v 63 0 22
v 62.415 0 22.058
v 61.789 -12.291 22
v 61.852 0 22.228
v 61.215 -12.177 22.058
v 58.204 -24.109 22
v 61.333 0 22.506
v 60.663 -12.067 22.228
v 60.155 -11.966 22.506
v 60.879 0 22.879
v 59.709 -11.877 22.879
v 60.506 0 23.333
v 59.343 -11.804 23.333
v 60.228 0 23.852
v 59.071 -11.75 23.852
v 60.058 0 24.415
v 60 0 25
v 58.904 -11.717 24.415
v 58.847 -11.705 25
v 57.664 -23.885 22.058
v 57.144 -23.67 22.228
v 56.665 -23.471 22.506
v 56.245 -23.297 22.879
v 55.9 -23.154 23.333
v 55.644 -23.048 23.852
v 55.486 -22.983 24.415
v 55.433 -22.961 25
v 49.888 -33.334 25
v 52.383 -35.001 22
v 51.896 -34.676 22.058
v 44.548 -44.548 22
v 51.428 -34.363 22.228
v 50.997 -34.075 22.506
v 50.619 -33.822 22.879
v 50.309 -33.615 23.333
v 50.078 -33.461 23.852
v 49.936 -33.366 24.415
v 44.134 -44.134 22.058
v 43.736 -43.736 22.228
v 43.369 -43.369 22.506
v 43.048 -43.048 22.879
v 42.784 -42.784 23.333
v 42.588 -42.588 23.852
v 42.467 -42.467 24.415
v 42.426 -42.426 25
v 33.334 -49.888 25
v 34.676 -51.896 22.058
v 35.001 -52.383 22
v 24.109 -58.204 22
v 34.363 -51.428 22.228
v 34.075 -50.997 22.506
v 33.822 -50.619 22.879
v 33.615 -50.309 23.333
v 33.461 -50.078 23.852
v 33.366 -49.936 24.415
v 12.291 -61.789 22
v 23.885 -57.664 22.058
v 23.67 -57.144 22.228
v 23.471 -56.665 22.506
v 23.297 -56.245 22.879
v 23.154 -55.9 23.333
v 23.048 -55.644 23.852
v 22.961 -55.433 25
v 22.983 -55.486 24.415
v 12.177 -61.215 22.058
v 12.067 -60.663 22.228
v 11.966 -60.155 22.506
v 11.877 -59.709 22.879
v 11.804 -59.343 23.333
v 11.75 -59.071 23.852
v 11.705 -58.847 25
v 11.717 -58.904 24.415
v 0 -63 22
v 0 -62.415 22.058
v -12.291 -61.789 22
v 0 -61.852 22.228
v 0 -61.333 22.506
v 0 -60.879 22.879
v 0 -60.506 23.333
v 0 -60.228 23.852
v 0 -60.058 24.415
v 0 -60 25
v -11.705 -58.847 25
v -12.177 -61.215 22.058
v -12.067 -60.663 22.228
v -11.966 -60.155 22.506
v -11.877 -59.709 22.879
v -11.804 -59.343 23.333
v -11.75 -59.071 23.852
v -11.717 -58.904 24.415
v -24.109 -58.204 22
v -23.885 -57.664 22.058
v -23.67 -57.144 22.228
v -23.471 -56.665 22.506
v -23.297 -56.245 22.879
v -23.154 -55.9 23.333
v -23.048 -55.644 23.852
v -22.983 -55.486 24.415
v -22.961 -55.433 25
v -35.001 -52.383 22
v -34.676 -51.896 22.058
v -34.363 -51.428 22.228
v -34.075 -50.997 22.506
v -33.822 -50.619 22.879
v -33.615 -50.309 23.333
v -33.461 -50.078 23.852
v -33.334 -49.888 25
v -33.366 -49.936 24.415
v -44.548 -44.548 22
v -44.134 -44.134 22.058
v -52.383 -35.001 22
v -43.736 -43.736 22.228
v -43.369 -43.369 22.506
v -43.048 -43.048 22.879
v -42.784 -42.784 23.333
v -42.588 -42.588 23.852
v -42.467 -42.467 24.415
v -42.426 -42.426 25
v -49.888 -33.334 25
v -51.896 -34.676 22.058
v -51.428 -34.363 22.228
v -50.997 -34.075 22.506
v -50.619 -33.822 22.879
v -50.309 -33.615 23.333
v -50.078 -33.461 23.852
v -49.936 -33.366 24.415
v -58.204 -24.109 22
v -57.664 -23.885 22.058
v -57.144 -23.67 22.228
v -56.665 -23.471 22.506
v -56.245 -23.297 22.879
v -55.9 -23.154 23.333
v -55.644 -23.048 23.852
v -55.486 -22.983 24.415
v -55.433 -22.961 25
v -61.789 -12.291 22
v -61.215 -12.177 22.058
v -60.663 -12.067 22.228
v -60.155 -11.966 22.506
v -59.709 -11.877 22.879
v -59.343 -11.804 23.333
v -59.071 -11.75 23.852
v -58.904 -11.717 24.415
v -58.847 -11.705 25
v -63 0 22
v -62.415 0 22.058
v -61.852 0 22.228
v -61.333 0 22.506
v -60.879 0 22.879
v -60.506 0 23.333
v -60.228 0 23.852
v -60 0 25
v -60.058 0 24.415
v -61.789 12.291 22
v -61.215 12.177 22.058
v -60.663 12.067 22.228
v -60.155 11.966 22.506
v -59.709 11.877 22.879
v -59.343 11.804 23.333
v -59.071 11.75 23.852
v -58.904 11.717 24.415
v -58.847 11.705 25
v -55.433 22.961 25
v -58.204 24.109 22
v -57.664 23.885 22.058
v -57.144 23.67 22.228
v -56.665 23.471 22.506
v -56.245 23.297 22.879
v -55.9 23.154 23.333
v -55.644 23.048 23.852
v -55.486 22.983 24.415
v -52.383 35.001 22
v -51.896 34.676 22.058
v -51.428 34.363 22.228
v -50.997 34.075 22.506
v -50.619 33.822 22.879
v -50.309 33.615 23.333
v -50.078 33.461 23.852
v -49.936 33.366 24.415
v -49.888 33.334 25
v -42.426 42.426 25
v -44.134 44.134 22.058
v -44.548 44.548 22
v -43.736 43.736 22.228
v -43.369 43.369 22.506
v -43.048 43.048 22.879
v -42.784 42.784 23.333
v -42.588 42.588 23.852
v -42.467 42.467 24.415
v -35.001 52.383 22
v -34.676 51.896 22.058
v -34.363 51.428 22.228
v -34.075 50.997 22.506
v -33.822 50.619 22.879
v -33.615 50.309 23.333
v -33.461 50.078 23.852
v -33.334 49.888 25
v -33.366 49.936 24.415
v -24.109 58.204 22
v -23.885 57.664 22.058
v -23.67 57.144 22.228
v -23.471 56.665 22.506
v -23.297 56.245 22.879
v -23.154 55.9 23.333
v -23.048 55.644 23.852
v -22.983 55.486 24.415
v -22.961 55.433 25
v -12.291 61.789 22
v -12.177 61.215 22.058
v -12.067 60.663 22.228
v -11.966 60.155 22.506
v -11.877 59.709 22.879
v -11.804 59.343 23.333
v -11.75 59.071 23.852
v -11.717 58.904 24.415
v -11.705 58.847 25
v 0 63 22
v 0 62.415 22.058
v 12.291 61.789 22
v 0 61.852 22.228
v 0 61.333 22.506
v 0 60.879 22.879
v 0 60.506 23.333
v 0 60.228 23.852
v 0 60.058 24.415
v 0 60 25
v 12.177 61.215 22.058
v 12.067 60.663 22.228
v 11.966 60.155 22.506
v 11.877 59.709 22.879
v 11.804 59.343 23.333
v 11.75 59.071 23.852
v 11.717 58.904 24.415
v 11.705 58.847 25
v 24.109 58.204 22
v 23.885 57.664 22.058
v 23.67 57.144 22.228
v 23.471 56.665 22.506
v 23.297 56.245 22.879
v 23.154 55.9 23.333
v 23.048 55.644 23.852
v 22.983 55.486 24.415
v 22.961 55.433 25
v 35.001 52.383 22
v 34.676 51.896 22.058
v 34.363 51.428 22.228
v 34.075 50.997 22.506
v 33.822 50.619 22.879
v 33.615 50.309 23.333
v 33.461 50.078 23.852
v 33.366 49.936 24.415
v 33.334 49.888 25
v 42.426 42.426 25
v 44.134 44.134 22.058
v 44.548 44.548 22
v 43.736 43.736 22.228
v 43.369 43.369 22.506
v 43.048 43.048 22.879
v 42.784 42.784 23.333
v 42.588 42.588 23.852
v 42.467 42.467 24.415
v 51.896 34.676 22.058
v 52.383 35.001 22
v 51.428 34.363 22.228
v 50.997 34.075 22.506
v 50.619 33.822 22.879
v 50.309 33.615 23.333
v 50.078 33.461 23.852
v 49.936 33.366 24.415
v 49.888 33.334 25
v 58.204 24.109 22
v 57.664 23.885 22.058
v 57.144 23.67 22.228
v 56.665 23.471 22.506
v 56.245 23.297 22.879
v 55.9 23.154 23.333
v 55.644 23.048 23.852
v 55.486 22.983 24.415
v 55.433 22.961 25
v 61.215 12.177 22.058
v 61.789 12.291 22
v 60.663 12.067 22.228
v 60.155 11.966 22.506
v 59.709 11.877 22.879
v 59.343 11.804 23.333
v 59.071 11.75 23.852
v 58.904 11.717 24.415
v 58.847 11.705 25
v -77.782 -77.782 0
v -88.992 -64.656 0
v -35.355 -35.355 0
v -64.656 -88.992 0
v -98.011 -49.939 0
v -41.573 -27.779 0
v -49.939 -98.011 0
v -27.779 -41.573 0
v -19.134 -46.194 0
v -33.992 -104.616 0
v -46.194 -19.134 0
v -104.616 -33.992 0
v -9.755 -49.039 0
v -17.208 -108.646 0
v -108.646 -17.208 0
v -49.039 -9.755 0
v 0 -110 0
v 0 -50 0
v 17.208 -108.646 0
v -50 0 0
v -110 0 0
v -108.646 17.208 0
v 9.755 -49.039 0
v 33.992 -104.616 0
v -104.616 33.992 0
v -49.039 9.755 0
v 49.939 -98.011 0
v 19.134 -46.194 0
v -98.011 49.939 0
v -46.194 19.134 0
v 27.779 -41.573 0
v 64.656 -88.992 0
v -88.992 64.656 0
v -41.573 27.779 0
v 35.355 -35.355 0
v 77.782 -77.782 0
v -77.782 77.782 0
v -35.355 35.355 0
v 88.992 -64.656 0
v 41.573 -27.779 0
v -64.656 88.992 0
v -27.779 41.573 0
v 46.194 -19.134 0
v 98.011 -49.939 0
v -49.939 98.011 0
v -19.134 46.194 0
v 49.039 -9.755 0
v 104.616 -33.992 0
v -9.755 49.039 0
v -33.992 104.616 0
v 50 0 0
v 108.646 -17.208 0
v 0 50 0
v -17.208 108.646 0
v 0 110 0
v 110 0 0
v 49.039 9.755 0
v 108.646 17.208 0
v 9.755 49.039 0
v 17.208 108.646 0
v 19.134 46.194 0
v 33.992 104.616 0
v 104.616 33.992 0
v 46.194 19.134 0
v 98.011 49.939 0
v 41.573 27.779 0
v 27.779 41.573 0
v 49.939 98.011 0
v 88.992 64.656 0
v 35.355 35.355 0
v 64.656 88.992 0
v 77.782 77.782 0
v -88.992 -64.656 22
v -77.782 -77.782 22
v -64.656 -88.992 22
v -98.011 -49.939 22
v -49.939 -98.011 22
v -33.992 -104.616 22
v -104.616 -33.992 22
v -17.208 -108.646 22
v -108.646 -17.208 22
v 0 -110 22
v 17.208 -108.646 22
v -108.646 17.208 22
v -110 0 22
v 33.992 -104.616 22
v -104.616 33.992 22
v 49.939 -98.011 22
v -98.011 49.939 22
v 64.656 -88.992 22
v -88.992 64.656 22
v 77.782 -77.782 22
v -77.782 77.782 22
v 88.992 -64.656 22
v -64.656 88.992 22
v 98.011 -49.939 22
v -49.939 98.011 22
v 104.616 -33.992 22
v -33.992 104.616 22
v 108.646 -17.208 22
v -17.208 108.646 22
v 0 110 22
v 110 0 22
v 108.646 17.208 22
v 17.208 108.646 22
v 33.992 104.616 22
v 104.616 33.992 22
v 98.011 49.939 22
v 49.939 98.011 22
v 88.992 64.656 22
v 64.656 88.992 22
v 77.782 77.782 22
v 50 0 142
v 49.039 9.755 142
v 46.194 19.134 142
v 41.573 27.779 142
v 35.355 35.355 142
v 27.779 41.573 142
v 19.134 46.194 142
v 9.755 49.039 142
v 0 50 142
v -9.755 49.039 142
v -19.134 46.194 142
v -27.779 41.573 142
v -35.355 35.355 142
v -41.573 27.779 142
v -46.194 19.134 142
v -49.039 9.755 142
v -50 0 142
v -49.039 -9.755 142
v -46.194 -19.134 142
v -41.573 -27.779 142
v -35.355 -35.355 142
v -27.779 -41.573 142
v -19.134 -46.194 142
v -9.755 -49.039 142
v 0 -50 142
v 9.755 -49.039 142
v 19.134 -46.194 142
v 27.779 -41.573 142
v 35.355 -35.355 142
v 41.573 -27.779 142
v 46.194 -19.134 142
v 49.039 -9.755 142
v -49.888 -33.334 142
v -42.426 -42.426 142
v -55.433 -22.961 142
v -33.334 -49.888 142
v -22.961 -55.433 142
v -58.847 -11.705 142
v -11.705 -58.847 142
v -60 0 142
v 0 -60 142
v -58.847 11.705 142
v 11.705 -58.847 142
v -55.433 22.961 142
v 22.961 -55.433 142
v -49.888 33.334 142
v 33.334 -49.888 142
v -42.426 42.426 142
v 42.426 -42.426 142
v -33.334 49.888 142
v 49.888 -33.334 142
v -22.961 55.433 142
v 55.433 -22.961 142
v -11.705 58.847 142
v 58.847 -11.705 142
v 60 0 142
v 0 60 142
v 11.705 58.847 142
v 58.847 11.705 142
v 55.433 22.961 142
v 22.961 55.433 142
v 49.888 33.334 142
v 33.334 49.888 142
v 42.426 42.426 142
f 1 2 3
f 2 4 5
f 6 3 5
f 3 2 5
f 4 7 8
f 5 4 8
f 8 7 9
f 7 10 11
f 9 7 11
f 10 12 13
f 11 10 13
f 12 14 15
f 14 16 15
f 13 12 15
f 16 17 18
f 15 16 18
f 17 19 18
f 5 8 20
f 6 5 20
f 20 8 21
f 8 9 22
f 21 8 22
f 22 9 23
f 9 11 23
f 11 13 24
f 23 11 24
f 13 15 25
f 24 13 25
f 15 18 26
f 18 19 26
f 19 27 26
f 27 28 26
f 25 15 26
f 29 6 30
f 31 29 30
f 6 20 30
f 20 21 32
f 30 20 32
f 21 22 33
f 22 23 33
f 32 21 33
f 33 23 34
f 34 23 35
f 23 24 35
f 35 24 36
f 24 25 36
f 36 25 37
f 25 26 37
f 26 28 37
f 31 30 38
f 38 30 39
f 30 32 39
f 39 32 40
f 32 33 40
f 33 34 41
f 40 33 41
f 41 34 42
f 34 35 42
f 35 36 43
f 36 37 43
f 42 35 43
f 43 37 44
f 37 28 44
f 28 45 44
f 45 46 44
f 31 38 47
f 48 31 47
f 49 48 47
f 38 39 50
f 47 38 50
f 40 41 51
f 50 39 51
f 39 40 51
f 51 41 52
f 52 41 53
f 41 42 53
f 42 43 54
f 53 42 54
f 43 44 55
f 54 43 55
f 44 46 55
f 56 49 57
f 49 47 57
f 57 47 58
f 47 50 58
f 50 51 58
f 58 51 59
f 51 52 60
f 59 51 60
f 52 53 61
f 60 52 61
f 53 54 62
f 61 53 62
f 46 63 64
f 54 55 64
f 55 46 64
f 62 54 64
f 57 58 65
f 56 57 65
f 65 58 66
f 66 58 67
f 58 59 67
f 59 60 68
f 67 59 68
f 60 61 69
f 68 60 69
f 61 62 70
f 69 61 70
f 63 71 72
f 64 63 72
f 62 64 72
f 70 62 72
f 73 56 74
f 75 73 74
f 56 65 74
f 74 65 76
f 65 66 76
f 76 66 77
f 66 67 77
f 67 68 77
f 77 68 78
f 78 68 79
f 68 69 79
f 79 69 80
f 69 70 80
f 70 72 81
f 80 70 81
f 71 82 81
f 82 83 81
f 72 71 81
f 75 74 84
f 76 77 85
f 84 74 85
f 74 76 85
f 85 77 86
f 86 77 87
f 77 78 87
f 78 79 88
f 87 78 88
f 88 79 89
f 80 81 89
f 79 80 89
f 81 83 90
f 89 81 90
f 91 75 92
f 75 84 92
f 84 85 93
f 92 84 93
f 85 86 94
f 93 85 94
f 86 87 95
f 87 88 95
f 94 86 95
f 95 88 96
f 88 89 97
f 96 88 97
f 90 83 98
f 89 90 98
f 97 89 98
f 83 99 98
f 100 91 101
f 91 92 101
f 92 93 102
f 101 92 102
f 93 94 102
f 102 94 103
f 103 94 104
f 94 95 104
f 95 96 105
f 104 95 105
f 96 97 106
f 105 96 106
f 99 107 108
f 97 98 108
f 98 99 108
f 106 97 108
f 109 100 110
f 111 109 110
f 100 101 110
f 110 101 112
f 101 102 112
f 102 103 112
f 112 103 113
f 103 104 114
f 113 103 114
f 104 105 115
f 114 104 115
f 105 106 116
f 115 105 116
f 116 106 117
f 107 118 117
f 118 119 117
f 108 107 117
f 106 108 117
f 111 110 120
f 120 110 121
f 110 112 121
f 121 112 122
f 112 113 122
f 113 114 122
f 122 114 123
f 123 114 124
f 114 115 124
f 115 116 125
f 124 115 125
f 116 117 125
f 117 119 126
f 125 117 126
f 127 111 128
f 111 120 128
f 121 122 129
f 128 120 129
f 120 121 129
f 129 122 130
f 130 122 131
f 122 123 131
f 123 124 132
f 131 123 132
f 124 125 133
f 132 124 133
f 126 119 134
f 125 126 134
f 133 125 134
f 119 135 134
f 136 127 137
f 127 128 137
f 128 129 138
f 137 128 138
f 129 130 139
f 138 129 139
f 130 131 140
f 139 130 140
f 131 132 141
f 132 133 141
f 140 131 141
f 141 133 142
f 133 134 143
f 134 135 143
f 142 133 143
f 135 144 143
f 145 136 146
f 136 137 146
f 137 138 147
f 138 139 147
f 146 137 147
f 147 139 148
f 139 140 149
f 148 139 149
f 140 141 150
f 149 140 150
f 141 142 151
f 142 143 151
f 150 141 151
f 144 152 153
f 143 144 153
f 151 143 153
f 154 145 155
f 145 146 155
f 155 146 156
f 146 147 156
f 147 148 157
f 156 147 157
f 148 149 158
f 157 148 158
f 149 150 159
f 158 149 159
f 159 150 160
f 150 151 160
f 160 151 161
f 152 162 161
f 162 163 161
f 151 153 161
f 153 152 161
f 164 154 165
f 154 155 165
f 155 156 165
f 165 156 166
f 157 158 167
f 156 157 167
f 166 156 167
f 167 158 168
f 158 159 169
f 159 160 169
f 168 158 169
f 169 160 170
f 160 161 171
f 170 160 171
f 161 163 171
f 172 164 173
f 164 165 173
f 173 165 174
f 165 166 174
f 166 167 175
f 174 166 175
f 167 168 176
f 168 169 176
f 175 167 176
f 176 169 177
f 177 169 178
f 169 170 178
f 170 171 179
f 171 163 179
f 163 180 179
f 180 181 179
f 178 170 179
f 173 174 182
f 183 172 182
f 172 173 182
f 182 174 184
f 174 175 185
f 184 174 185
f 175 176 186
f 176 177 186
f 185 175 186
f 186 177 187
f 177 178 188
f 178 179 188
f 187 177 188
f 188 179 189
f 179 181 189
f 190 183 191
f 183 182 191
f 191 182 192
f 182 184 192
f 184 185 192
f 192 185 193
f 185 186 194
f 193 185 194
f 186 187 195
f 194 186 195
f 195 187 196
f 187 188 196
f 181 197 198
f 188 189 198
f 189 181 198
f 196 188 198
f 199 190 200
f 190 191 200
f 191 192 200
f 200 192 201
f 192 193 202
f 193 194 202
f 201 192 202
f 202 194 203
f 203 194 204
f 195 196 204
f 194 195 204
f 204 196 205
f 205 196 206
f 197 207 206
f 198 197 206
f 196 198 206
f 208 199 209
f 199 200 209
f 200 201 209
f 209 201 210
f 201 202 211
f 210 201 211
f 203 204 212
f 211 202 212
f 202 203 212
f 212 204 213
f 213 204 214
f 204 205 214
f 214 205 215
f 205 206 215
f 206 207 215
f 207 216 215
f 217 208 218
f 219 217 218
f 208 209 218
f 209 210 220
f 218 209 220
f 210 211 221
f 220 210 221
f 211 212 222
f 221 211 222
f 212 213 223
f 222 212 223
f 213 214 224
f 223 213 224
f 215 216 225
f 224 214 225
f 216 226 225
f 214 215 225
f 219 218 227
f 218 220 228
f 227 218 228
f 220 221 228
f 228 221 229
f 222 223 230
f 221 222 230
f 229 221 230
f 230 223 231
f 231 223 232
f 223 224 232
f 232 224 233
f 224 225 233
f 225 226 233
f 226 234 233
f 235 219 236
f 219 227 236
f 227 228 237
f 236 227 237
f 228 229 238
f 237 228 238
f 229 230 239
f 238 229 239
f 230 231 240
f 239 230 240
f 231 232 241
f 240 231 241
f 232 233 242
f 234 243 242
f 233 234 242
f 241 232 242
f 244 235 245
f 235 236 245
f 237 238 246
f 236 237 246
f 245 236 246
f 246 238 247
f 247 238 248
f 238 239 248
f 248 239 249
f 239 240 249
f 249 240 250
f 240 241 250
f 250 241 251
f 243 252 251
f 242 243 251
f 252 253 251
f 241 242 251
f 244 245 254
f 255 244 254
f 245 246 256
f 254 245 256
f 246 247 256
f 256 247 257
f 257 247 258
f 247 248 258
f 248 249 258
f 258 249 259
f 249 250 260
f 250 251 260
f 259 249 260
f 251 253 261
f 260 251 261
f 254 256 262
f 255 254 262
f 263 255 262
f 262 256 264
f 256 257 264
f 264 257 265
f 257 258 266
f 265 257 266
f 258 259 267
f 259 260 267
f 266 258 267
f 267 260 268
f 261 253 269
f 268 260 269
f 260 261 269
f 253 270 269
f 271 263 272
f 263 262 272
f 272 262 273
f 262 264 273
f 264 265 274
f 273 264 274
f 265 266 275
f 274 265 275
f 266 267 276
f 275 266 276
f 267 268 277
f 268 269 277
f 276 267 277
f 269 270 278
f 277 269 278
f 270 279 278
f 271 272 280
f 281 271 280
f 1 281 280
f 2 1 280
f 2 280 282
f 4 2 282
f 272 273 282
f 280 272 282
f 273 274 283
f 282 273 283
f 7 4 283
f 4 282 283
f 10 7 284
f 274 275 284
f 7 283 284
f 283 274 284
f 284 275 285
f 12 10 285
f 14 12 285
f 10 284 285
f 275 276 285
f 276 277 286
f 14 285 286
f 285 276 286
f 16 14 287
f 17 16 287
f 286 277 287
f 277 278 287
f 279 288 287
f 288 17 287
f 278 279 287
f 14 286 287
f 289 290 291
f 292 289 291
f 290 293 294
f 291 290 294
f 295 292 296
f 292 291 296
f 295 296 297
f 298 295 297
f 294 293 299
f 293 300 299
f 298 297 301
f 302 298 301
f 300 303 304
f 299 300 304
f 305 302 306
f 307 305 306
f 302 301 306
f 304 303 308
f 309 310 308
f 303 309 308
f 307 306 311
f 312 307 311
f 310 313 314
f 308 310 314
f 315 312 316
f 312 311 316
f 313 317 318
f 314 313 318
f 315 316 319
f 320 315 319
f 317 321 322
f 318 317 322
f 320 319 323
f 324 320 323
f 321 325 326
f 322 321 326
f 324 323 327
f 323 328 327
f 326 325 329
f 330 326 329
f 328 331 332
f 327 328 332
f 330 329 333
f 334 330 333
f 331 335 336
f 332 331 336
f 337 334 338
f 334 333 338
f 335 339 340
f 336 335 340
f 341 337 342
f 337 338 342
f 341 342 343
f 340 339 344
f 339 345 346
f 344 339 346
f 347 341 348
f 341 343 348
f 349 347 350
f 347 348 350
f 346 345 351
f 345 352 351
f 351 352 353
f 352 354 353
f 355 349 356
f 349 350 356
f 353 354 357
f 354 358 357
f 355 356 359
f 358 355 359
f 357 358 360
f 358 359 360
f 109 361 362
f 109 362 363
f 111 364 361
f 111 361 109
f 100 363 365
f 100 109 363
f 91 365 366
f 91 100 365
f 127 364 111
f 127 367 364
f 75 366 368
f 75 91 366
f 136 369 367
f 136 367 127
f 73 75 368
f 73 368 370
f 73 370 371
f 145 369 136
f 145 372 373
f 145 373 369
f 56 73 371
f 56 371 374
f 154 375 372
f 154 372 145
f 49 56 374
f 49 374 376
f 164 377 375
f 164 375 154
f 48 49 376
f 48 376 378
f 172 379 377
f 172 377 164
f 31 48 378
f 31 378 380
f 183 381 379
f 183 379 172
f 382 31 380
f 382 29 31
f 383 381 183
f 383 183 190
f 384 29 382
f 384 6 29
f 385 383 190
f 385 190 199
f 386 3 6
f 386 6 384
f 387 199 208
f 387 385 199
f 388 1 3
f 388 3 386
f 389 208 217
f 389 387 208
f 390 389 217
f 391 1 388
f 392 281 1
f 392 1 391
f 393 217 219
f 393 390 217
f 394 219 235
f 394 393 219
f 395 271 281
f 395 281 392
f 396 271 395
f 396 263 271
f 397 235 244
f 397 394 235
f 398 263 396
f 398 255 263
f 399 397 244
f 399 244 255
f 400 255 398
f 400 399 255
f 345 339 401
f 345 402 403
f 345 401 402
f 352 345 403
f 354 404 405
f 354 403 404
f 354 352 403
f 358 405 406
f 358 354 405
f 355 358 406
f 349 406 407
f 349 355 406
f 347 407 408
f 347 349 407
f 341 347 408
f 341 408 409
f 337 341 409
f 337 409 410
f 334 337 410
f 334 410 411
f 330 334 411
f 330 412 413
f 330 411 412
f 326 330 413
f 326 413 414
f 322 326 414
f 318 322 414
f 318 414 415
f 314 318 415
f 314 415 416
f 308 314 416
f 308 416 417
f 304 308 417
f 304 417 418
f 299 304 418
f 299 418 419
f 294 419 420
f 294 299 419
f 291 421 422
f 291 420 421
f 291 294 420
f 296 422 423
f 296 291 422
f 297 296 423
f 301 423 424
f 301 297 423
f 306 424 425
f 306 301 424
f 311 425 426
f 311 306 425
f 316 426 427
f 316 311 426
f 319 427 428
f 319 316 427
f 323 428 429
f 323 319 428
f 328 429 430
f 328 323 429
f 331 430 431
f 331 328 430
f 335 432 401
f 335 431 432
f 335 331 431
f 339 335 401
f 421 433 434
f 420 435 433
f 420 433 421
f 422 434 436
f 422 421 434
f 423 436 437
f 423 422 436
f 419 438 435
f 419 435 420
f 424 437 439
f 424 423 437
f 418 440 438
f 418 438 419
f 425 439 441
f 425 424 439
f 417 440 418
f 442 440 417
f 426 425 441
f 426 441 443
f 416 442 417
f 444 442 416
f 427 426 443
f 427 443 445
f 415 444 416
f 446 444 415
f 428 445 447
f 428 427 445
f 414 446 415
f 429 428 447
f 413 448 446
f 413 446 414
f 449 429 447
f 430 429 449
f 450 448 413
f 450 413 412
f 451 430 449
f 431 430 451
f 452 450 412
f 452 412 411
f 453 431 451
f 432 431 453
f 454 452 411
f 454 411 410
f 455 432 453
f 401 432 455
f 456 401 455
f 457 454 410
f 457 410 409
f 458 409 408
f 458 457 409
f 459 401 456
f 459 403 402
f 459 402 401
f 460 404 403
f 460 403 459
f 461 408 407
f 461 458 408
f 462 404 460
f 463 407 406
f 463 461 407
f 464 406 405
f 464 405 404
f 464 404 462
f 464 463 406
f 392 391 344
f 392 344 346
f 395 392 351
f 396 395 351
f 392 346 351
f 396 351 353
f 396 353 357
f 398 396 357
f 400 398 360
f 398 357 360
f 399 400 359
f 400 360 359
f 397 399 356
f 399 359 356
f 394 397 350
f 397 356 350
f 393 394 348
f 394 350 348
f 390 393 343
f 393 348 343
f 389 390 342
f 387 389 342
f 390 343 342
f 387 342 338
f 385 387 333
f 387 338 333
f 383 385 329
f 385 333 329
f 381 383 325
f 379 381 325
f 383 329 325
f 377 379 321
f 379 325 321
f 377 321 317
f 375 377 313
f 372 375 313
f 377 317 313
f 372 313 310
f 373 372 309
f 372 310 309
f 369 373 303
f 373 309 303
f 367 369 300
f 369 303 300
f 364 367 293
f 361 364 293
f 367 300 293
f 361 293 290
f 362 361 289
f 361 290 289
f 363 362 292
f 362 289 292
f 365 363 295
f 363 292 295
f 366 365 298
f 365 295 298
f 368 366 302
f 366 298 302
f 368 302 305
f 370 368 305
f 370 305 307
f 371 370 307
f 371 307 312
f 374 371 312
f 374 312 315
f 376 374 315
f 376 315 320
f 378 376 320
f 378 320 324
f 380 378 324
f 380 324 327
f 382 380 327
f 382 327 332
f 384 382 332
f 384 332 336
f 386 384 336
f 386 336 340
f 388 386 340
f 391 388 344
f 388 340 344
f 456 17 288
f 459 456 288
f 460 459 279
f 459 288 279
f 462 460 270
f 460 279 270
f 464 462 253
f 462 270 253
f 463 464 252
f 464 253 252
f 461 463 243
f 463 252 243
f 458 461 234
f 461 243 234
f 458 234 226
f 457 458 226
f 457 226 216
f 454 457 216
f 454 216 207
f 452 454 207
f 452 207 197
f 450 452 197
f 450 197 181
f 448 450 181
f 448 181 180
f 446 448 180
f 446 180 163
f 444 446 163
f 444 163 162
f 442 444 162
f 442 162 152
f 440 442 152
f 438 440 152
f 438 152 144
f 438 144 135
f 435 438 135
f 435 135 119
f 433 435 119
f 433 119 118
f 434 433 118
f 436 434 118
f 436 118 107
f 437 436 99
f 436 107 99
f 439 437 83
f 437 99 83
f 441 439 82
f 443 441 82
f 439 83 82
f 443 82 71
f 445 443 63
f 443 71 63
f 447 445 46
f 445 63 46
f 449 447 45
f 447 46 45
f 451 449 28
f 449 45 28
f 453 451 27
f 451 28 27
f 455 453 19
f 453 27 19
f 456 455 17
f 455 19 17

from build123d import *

# Parameters (mm, degrees)
SKETCH1_R                = 110
BOSS_EXTRUDE1_DEPTH      = 22
BOSS_EXTRUDE2_DEPTH      = 120
BOSS_EXTRUDE2_DEPTH_BACK = 22
SKETCH2_R                = 60
CUT_EXTRUDE3_DEPTH       = 211.627633515
CUT_EXTRUDE3_DEPTH_BACK  = 120
SKETCH3_R                = 50
FILLET1_R                = 3


with BuildPart() as part:
    # Sketch1 → Boss-Extrude1 (new body)
    with BuildSketch(Plane.XY):
        Circle(SKETCH1_R)
    extrude(amount=BOSS_EXTRUDE1_DEPTH)

    # Sketch2 → Boss-Extrude2 (add, two sides: drawn at the far end of the back side and taken through both)
    with BuildSketch(Plane.XY.offset(22).offset(-BOSS_EXTRUDE2_DEPTH_BACK)):
        Circle(SKETCH2_R)
    extrude(amount=BOSS_EXTRUDE2_DEPTH + BOSS_EXTRUDE2_DEPTH_BACK)

    # Sketch3 → Cut-Extrude3 (cut, two sides: drawn at the far end of the back side and taken through both)
    with BuildSketch(Plane.XY.offset(-CUT_EXTRUDE3_DEPTH_BACK)):
        Circle(SKETCH3_R)
    extrude(amount=CUT_EXTRUDE3_DEPTH + CUT_EXTRUDE3_DEPTH_BACK, mode=Mode.SUBTRACT)

    # Fillet1
    fillet1_edges = [part.edges().sort_by_distance(p)[0] for p in [
        (-60, 0, 22),
    ]]
    fillet(fillet1_edges, radius=FILLET1_R)


solid = part.part
